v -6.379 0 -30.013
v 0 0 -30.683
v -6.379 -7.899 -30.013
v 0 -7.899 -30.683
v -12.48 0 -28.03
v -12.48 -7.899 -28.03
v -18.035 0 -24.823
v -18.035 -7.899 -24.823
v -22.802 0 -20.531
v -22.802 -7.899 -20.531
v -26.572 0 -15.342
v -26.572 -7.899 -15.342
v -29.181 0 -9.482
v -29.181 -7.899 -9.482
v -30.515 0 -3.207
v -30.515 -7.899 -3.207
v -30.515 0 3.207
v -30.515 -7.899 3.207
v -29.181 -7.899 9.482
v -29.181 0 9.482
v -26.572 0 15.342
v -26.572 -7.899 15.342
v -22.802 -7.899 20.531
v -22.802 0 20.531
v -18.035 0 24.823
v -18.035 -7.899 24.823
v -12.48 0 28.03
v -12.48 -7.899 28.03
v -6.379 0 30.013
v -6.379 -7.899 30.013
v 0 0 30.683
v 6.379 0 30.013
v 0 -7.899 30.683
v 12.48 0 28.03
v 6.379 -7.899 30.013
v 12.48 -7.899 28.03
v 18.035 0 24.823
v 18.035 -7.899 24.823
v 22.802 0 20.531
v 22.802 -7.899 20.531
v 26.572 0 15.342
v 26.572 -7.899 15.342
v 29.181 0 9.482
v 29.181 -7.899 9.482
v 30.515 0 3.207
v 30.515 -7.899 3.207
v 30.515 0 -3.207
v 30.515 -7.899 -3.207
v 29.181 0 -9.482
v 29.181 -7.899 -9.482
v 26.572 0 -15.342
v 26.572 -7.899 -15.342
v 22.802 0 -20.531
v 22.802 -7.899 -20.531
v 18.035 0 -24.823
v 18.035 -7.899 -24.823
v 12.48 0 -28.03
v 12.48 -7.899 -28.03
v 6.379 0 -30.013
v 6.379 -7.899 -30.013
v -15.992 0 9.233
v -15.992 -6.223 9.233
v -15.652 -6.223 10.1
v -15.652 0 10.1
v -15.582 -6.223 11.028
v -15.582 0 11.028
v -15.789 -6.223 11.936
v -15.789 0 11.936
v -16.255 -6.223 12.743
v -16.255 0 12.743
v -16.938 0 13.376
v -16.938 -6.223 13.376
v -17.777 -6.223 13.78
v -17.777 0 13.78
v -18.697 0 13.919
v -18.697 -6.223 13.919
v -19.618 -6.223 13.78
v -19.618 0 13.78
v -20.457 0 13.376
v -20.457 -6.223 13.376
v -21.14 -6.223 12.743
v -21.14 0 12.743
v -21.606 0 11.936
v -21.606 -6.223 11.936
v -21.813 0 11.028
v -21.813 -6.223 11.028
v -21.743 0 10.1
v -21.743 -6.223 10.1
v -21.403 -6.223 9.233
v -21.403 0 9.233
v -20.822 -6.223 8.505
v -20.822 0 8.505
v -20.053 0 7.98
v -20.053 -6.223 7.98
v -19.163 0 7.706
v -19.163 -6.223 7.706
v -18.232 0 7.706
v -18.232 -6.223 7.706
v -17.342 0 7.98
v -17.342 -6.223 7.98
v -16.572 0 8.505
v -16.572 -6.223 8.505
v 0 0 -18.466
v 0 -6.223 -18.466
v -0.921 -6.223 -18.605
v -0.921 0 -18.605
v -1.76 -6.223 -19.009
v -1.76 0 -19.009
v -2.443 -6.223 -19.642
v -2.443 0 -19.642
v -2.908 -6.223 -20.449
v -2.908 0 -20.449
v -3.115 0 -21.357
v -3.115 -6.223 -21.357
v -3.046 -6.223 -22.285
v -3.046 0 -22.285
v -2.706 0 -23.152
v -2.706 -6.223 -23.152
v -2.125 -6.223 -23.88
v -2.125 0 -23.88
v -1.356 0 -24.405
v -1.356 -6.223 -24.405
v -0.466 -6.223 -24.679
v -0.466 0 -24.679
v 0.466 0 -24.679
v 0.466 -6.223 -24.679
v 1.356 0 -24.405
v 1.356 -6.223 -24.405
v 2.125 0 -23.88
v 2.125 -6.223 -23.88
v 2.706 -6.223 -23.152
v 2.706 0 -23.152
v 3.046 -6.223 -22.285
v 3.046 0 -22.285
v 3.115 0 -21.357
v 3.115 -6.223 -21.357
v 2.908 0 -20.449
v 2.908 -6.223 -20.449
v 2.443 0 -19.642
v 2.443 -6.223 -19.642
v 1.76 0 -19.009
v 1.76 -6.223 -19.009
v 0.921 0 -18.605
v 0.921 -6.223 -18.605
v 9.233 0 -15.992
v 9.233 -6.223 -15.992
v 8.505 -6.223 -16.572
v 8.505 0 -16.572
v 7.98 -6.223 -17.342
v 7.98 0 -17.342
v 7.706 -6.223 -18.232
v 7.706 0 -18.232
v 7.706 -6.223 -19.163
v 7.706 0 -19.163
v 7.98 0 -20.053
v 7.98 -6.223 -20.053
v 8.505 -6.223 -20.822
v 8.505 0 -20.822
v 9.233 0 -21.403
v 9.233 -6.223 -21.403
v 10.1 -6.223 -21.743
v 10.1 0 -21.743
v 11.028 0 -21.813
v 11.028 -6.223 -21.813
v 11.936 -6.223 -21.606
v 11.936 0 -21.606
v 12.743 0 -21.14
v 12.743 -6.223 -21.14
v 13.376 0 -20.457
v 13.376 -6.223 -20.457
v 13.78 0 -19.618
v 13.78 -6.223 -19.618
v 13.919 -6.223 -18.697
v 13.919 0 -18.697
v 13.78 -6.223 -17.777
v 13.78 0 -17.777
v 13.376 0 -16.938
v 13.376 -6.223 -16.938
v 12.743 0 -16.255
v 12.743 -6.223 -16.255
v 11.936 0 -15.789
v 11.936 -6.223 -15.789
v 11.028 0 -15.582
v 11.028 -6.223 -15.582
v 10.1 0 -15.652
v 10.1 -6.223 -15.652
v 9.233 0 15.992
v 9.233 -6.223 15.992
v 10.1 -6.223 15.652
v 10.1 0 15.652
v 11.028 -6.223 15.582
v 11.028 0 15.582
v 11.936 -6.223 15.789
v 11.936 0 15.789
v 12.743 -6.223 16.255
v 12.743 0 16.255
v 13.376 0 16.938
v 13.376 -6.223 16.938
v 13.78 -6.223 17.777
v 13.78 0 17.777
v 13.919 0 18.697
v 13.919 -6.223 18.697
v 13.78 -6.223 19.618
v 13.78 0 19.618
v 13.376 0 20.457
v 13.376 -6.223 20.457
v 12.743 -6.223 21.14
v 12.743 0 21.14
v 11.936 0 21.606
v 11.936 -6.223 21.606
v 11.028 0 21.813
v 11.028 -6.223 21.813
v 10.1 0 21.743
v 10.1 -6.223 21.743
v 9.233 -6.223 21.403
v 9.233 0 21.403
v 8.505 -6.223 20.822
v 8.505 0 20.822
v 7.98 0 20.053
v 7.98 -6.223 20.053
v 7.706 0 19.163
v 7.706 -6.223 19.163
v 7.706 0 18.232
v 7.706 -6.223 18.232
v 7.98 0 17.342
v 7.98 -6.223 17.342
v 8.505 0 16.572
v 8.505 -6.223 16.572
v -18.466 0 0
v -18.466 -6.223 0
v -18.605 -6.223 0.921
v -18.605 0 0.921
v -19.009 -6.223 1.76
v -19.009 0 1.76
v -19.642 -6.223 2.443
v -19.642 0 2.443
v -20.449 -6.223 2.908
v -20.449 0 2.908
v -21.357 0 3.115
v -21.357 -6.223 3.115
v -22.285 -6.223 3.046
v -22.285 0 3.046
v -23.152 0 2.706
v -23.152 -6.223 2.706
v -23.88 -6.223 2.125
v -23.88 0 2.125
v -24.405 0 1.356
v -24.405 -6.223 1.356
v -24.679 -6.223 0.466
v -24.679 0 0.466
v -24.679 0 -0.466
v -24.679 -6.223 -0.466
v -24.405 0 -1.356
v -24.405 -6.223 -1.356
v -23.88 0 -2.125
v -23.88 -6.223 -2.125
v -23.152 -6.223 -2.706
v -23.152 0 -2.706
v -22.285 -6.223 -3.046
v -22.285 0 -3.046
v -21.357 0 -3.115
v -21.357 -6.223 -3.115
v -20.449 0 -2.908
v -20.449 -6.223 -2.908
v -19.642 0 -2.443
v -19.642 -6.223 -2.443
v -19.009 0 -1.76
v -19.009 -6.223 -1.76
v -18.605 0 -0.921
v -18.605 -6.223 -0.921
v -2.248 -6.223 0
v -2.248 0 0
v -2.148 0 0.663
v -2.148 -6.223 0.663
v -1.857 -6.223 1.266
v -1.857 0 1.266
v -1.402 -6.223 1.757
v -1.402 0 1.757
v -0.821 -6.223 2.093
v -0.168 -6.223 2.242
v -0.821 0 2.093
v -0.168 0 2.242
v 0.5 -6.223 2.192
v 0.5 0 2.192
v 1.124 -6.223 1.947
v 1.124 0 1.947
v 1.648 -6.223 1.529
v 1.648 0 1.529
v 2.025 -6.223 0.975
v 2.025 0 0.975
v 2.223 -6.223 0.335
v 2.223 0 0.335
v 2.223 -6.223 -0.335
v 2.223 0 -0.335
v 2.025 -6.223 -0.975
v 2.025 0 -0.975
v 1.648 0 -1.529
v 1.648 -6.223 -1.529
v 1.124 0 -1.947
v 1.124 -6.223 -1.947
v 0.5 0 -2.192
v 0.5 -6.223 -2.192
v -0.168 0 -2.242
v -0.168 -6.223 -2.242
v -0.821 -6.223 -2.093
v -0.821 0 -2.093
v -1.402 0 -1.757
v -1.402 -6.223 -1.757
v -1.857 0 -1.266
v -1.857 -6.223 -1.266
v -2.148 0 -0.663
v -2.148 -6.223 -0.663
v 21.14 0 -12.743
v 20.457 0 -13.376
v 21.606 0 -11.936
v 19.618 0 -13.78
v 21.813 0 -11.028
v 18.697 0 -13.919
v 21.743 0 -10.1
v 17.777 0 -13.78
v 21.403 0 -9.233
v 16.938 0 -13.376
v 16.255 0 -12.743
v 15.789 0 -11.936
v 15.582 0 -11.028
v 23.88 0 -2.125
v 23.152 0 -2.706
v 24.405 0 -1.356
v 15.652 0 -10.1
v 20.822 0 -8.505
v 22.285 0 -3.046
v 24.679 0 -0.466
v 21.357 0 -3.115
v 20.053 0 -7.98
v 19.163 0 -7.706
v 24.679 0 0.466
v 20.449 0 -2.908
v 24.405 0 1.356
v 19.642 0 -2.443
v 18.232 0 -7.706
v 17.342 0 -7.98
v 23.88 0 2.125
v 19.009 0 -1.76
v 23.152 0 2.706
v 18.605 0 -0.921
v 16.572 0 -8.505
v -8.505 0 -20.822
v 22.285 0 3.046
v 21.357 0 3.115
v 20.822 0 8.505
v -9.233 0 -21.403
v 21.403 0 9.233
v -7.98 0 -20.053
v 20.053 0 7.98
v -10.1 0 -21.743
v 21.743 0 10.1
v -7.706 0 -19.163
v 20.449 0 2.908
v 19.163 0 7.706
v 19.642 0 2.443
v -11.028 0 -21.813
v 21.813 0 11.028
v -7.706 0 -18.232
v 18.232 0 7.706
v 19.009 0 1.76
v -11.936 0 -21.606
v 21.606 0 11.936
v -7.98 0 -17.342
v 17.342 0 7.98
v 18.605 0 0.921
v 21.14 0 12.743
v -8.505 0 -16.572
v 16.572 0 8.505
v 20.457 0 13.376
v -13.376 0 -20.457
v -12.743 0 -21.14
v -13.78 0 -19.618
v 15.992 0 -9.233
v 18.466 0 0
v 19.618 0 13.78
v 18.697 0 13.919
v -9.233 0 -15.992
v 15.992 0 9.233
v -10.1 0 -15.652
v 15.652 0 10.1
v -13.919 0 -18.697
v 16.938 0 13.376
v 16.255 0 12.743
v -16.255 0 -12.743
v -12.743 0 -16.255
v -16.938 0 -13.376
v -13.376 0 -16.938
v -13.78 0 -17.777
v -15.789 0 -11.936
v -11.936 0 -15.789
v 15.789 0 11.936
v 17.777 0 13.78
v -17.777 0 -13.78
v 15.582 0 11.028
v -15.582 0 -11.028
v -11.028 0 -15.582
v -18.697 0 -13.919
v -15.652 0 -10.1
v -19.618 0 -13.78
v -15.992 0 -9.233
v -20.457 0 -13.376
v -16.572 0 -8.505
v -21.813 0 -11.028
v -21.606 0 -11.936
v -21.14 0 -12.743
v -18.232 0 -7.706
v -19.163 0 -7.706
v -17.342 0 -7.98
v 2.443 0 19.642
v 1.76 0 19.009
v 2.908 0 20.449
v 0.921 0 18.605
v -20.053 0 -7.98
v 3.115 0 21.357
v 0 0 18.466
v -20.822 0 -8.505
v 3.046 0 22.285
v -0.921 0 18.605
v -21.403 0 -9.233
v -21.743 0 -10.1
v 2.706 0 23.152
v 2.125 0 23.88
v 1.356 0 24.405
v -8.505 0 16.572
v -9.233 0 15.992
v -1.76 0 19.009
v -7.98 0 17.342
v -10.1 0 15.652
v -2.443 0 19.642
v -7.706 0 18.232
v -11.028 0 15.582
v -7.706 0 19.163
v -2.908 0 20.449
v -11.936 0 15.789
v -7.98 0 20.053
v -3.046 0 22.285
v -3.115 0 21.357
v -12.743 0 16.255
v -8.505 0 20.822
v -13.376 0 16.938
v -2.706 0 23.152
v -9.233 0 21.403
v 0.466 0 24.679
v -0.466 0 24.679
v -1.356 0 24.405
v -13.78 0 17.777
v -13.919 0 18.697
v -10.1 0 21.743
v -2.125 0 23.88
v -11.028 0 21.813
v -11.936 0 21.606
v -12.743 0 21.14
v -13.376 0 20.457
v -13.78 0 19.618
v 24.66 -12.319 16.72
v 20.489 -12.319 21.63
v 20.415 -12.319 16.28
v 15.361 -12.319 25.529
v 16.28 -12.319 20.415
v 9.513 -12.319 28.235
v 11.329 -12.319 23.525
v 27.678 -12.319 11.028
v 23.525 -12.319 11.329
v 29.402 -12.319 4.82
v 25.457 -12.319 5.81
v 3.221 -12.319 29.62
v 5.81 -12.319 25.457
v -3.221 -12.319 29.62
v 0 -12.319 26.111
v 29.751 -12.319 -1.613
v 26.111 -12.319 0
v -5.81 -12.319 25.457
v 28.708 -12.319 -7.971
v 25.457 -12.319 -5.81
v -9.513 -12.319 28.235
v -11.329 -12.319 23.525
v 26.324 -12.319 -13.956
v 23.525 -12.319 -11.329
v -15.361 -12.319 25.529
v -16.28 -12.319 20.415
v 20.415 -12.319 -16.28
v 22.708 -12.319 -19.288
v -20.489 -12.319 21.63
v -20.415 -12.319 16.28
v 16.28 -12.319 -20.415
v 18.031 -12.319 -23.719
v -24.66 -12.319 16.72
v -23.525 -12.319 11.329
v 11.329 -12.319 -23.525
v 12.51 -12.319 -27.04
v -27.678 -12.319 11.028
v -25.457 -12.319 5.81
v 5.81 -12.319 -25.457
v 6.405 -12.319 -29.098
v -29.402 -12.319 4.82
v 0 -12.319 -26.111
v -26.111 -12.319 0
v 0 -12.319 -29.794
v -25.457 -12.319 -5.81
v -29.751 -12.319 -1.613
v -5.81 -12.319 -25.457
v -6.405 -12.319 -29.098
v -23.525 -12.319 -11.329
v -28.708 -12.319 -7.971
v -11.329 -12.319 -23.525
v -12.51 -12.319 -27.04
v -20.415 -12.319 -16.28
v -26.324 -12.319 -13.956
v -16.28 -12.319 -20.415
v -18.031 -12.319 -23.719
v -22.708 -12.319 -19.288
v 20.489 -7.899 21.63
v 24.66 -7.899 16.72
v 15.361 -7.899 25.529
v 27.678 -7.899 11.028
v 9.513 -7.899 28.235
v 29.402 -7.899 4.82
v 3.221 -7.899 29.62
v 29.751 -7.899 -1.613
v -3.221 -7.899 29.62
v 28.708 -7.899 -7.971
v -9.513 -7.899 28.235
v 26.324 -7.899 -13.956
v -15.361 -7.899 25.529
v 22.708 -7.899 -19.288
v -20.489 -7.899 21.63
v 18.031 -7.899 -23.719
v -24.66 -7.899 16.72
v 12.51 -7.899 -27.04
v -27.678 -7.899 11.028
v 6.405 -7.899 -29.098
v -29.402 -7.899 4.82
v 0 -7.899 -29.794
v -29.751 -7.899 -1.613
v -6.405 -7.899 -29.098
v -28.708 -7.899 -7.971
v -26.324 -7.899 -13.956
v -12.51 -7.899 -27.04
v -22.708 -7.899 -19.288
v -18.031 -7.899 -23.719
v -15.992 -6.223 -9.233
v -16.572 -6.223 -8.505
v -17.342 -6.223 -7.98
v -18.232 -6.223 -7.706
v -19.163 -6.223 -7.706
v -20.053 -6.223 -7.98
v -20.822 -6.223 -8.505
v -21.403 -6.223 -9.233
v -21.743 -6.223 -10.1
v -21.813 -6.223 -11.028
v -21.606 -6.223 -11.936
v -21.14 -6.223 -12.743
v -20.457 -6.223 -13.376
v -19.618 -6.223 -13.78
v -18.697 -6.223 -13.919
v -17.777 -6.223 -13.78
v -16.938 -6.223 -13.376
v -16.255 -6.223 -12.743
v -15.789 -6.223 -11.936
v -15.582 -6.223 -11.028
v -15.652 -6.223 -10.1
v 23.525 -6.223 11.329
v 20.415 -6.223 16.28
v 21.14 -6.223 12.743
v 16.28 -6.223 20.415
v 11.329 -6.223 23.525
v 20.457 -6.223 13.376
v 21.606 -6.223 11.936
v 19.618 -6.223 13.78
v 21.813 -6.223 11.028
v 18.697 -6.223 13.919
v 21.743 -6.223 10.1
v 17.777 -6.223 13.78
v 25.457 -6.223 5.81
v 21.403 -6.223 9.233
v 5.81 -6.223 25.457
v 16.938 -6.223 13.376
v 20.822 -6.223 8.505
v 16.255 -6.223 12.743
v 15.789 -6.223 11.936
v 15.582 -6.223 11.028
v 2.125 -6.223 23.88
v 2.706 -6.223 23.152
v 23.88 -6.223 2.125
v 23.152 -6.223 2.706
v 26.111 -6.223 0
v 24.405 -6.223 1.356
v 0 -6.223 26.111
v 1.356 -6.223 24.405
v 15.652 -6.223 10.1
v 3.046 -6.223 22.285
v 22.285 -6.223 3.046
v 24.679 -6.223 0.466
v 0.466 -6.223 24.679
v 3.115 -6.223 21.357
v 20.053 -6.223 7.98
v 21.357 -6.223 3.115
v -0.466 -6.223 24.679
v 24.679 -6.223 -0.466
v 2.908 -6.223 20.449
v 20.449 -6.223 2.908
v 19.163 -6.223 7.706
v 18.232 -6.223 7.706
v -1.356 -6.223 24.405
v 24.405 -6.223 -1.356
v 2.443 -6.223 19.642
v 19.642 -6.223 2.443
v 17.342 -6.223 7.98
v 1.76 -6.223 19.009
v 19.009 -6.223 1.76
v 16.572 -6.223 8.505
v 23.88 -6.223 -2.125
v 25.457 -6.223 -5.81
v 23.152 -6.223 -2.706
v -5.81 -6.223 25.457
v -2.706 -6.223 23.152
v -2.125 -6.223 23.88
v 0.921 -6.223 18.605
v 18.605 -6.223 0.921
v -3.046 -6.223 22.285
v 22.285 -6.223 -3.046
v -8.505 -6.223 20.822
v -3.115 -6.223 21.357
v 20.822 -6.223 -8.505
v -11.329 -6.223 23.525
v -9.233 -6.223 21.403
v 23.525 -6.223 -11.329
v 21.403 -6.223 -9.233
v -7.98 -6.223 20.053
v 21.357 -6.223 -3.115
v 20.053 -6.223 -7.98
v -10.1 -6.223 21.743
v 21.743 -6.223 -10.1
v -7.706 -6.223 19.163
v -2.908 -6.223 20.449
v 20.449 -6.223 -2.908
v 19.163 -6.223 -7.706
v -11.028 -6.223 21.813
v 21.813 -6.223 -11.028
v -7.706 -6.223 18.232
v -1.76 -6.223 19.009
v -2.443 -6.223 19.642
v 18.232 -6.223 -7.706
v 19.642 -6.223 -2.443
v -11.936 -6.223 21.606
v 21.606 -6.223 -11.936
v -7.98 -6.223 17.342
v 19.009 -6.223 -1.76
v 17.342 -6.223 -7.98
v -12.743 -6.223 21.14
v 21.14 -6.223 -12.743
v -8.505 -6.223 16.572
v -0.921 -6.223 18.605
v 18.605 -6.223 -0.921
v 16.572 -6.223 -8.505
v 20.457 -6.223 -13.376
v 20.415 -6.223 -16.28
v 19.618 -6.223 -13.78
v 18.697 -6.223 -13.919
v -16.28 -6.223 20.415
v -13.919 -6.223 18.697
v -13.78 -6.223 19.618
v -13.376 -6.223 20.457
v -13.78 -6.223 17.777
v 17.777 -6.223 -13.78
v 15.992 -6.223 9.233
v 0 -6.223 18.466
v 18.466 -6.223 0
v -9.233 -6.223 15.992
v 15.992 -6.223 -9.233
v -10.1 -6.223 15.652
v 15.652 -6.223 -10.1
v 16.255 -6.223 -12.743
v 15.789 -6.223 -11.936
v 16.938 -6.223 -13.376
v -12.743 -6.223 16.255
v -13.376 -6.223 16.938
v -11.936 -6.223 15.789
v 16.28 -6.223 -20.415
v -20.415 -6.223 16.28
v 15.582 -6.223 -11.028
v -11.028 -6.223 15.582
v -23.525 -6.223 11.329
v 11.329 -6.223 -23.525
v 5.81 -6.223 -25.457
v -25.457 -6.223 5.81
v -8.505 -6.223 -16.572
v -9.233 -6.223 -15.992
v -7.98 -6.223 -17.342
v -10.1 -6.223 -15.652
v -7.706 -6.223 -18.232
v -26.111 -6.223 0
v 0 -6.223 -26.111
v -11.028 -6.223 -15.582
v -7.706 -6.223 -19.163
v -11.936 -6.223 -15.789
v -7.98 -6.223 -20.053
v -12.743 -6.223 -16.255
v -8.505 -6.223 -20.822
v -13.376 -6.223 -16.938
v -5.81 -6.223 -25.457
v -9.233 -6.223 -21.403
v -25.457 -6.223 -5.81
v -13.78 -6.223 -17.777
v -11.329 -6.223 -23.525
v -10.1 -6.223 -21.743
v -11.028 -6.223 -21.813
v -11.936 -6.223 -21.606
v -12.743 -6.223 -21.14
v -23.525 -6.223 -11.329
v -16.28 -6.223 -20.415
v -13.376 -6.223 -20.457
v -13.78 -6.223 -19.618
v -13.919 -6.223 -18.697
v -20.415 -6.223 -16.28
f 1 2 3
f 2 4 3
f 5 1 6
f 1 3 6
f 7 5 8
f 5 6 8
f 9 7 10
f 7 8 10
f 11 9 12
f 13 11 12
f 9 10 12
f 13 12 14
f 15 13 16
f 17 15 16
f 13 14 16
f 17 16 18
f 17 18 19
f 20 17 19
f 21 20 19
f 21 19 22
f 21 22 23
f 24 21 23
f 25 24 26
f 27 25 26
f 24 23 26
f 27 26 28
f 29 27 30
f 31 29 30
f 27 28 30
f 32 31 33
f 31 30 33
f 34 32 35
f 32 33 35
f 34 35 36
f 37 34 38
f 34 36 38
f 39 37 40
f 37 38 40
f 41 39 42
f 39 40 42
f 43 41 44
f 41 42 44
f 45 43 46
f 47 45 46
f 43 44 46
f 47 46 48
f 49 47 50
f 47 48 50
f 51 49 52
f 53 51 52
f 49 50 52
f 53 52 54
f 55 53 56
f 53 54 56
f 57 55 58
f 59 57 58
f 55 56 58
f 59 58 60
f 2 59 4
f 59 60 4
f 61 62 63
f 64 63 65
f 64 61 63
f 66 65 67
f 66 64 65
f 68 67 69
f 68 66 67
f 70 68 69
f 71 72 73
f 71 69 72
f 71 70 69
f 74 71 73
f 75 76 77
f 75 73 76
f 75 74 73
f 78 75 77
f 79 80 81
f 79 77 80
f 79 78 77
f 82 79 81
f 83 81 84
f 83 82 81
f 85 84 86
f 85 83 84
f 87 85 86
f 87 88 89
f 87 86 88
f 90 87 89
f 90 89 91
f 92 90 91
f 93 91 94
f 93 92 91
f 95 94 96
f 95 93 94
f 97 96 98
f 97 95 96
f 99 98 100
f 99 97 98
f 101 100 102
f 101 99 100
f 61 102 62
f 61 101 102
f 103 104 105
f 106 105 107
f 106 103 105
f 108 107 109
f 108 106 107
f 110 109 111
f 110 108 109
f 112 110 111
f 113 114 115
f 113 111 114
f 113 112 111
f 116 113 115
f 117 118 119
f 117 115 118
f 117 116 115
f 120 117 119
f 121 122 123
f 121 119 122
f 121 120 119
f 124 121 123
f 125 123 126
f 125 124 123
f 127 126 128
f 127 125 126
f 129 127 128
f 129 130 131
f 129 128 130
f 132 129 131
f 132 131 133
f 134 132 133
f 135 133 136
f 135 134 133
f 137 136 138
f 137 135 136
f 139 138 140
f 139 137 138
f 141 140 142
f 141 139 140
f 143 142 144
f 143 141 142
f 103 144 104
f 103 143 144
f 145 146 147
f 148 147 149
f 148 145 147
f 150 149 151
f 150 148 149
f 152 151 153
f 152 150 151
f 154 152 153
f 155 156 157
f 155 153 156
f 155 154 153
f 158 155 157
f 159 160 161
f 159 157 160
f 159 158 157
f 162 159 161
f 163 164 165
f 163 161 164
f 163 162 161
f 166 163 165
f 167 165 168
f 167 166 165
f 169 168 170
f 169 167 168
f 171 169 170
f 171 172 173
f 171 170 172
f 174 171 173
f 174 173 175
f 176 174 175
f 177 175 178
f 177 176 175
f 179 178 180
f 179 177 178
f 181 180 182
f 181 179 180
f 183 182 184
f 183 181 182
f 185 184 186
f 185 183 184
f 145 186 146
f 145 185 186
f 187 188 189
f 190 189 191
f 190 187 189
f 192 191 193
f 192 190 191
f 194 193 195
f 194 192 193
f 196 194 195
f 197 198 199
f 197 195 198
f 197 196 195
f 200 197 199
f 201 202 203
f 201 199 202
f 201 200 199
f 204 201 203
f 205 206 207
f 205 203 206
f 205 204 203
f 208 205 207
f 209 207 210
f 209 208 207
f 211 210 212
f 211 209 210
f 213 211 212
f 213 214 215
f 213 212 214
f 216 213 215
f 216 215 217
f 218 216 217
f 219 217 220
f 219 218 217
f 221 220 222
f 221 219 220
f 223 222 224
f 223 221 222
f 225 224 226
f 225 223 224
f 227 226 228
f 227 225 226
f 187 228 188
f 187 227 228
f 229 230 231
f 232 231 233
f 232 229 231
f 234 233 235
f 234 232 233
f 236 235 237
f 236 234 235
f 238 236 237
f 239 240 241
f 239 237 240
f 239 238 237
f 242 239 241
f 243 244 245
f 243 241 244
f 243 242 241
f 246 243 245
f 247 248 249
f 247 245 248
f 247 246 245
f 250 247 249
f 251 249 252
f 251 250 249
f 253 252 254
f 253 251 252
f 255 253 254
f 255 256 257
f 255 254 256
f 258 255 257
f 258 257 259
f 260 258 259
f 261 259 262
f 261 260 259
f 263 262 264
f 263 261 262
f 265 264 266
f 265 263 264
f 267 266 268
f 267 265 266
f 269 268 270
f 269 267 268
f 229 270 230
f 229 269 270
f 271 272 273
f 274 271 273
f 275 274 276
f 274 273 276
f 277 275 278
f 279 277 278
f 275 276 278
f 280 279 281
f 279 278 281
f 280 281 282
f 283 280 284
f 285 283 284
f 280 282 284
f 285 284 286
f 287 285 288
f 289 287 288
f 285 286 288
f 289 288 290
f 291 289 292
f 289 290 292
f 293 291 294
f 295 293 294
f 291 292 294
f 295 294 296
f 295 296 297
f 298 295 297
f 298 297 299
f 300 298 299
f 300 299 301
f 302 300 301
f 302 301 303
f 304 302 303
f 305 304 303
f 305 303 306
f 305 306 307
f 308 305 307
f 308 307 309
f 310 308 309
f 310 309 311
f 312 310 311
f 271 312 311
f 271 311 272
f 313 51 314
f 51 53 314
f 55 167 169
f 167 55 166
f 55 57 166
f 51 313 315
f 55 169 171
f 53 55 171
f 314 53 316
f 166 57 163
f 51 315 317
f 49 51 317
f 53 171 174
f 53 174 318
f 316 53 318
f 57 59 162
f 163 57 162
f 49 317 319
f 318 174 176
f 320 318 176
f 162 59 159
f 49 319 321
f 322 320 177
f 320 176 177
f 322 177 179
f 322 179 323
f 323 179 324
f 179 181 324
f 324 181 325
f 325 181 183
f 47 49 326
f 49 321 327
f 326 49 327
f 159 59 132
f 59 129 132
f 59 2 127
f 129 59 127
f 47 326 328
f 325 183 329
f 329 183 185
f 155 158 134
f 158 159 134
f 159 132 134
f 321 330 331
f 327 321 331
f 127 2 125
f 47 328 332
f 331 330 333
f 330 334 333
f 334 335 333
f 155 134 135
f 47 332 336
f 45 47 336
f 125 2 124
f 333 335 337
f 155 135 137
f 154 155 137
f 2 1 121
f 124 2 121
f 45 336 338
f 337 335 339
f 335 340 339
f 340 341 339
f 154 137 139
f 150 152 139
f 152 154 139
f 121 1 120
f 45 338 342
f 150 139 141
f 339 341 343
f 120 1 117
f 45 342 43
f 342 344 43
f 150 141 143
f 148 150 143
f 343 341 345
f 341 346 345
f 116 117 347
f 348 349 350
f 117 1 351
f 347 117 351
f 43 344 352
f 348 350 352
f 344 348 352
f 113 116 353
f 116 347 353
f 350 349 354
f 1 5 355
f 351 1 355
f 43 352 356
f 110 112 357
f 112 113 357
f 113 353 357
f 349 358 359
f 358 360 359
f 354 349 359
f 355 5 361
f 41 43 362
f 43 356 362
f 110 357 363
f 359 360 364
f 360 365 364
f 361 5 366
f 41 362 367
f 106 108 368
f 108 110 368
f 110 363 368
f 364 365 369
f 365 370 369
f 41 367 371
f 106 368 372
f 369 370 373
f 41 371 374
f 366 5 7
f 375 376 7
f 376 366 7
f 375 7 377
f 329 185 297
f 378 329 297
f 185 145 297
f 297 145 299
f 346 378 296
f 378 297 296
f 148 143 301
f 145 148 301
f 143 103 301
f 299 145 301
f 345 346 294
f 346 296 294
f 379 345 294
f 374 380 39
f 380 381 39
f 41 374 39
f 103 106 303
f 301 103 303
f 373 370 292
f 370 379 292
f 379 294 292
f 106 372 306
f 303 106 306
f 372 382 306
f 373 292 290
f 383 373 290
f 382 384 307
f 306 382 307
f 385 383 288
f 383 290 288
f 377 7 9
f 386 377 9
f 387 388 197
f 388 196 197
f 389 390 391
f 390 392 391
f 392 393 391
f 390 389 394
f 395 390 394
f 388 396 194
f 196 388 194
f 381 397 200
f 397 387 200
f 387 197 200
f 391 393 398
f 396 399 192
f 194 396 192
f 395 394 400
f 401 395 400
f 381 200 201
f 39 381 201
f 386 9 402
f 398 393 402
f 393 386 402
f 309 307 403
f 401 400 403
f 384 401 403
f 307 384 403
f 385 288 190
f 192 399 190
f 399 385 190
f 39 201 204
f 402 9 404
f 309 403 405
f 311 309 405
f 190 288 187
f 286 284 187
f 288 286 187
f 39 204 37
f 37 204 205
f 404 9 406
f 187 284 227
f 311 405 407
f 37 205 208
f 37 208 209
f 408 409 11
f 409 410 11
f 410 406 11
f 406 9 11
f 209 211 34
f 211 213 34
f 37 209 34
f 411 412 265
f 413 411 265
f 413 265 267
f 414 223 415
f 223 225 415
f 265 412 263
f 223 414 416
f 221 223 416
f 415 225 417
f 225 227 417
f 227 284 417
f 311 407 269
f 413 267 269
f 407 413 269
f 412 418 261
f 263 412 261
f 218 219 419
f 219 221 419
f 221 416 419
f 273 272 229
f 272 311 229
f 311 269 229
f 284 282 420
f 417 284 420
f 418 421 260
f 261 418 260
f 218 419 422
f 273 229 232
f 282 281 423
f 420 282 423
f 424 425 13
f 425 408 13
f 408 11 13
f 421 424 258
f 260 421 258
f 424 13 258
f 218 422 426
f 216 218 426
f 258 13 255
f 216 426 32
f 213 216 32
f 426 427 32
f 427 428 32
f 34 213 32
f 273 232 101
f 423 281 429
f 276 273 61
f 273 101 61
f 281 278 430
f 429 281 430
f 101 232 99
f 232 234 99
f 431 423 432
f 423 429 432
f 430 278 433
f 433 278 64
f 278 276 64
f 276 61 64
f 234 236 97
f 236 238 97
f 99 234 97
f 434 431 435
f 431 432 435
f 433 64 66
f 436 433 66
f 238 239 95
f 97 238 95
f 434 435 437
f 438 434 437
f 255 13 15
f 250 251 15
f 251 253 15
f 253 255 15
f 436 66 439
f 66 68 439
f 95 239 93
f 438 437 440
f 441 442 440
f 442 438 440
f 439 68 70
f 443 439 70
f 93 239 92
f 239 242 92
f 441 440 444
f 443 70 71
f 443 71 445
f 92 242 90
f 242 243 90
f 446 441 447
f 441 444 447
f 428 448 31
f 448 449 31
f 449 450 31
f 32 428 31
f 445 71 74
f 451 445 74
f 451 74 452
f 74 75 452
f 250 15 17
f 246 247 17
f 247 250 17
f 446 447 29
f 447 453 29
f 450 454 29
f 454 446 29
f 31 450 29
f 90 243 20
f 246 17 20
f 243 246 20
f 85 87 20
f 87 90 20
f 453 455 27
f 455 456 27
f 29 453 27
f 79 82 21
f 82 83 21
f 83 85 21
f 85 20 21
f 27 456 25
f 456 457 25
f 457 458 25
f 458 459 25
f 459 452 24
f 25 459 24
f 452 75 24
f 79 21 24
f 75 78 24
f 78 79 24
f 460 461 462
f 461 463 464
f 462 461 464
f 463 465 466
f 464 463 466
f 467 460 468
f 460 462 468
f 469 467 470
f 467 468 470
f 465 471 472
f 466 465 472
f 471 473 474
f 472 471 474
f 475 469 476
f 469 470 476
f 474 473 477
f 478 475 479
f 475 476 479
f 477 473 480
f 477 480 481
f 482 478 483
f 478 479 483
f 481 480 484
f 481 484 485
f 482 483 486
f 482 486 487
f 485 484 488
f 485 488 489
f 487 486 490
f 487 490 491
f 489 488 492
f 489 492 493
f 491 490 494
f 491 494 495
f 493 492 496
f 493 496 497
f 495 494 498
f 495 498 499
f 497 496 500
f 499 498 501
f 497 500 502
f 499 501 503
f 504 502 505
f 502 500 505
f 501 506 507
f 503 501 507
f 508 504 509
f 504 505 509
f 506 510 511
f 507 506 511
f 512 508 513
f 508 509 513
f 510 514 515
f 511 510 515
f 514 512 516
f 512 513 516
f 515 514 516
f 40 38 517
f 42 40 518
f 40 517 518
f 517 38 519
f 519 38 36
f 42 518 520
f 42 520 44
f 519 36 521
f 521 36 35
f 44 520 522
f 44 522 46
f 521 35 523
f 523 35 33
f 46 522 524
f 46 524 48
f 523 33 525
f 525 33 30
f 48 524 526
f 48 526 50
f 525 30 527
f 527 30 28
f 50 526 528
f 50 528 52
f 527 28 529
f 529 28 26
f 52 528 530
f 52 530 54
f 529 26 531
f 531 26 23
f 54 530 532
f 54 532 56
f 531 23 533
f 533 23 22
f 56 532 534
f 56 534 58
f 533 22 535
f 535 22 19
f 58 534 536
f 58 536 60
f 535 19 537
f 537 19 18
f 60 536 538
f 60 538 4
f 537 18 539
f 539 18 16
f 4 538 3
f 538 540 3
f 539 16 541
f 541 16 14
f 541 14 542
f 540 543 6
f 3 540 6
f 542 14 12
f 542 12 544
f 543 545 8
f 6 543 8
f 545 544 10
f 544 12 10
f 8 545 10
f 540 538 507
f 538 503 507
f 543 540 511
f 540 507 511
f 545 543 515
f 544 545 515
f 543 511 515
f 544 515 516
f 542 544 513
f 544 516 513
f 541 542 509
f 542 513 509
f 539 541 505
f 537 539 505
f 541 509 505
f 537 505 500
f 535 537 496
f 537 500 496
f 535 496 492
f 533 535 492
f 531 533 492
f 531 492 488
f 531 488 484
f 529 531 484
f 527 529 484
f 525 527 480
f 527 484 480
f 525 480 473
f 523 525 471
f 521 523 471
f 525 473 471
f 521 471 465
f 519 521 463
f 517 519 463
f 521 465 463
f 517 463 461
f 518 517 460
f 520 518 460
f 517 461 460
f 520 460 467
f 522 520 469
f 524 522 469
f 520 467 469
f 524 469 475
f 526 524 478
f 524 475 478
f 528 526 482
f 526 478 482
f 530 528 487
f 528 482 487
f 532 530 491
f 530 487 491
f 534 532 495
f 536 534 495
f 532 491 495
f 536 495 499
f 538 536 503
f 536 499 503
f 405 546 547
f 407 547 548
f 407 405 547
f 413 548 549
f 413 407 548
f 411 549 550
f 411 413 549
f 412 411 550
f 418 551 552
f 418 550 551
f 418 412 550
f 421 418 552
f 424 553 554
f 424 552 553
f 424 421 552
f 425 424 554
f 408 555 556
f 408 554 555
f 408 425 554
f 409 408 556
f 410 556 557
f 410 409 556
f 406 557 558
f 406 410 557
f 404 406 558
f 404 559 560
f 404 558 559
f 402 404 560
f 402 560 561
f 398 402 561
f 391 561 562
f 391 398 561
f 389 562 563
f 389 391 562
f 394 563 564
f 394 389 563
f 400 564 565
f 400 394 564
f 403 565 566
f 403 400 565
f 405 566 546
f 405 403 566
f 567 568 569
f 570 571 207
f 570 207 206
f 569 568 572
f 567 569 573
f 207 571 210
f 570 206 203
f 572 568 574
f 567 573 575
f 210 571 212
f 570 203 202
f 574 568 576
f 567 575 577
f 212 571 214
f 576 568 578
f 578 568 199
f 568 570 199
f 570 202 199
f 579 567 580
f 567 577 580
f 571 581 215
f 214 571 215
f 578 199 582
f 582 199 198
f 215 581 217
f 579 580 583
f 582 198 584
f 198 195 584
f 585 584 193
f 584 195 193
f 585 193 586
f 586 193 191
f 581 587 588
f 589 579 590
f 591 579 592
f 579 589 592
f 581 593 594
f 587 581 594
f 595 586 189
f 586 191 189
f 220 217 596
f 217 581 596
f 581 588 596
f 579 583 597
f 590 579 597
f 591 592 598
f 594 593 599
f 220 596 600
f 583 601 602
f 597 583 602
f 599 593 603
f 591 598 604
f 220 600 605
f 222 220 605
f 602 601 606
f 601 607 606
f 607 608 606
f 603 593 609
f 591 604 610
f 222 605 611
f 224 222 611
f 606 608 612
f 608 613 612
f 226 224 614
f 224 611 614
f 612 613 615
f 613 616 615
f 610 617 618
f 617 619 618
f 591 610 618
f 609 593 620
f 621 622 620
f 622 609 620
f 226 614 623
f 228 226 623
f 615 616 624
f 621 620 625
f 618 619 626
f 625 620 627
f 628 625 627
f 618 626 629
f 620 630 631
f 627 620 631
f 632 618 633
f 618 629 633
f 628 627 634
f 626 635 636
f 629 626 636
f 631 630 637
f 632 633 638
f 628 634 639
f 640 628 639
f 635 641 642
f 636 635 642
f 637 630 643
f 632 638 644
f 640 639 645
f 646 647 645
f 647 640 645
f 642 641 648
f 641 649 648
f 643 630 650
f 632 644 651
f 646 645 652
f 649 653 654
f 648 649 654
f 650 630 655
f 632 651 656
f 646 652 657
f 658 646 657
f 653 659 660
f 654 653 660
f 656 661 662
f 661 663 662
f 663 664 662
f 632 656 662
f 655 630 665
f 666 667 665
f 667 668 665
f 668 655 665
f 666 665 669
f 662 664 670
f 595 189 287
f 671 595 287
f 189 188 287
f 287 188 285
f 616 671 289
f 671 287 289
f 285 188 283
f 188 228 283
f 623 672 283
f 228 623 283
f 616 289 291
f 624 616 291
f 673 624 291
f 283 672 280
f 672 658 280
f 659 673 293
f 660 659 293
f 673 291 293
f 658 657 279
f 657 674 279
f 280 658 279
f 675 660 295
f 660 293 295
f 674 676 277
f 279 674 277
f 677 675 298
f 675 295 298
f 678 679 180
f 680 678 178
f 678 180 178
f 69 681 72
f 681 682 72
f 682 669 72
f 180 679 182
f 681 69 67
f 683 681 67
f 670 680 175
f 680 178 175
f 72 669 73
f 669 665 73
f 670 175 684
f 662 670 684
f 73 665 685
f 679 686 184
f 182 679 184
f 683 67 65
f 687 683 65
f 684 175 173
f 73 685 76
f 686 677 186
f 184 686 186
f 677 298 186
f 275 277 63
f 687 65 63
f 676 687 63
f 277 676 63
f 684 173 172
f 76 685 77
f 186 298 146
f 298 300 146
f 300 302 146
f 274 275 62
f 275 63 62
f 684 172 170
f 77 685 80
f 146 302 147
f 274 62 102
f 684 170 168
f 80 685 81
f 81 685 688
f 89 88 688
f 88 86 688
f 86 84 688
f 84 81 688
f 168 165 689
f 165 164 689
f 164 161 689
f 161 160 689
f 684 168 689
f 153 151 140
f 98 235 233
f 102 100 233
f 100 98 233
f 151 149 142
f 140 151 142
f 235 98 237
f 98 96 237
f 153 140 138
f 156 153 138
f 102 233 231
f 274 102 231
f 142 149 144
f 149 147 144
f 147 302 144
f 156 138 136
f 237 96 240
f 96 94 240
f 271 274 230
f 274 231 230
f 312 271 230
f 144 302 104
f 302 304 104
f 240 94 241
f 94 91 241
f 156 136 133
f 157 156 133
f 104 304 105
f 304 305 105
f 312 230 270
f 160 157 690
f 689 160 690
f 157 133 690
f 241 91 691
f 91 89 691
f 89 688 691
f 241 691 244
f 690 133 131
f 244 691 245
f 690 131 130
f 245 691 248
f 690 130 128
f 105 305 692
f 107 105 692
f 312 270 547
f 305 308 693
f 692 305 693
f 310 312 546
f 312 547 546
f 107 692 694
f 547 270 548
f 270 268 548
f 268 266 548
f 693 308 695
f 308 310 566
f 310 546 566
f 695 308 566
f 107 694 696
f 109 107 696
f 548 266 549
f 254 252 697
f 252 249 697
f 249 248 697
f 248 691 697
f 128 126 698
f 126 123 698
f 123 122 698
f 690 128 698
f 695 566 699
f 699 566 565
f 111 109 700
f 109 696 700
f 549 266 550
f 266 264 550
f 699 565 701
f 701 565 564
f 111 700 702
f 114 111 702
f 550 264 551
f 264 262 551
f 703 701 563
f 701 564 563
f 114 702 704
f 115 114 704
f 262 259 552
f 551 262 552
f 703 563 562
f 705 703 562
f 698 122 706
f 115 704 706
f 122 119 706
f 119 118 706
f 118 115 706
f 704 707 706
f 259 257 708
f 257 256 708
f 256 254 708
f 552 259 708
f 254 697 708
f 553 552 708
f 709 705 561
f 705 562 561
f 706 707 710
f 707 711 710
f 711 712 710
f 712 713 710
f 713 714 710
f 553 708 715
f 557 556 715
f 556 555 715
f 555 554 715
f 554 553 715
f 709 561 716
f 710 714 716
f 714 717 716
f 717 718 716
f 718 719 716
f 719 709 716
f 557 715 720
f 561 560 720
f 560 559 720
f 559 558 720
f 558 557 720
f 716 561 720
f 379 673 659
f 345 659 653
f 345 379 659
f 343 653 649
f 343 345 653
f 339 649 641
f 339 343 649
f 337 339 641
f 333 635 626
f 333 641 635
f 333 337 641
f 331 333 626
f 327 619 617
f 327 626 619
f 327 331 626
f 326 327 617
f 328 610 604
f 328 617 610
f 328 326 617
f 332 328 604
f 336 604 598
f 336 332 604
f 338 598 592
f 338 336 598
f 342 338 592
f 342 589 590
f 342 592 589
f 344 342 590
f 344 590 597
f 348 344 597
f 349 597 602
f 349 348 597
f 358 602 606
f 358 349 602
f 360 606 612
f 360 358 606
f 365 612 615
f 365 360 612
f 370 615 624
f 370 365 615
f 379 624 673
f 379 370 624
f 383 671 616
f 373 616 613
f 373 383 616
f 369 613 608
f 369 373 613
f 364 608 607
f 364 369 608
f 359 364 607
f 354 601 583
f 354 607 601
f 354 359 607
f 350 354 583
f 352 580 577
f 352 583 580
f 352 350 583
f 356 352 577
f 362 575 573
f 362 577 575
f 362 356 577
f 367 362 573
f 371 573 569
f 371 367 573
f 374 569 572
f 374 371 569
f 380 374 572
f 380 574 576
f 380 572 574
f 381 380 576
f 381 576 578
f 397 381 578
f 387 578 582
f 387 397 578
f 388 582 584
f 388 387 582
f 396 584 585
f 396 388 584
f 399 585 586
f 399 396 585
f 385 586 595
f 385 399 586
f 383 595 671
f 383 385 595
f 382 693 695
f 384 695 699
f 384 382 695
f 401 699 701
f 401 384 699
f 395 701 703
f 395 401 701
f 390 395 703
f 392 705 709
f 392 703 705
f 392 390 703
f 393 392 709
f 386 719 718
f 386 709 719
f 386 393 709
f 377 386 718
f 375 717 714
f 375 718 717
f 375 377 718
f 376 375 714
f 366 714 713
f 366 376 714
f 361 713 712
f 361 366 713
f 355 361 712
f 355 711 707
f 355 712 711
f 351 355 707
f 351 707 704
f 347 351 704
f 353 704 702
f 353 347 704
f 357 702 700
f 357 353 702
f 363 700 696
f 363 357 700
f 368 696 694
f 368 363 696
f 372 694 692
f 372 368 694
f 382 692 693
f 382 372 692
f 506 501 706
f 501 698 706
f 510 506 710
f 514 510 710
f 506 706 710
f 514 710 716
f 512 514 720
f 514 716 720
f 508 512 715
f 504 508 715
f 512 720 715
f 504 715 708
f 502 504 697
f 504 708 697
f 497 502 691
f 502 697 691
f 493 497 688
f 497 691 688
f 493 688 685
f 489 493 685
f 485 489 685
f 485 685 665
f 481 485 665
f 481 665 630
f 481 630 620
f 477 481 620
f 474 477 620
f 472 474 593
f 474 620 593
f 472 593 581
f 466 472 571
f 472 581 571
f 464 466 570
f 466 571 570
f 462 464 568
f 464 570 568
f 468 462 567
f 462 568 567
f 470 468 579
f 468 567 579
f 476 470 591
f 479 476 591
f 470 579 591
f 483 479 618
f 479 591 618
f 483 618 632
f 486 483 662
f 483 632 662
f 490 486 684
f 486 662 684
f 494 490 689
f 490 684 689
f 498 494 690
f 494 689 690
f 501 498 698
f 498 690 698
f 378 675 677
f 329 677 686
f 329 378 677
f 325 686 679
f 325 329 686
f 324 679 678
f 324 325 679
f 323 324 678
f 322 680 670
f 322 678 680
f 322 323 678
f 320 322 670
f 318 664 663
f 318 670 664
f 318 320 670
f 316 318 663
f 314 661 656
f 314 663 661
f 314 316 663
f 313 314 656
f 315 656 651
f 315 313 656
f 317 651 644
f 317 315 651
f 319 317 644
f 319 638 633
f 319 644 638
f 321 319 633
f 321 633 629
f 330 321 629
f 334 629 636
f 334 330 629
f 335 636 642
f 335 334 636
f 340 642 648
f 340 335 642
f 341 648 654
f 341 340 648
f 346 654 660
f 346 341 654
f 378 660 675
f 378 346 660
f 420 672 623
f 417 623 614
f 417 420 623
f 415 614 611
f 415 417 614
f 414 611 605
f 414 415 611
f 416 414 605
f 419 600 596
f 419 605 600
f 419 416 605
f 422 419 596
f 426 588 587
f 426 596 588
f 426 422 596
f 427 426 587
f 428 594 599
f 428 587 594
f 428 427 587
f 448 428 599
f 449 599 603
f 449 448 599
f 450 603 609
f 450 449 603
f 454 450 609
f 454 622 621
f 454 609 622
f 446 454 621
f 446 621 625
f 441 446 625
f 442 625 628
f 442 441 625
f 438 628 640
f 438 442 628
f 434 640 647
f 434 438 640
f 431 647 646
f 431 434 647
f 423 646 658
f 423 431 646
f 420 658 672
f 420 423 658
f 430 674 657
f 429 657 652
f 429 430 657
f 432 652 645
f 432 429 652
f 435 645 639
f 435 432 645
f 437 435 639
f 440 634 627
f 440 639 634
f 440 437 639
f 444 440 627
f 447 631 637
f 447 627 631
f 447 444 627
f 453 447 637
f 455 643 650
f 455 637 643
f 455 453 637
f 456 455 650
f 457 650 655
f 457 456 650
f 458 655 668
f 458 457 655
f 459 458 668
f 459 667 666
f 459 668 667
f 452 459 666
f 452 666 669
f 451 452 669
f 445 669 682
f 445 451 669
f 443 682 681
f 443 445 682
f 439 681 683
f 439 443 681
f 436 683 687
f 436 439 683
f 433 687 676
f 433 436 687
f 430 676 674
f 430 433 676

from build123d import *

# Parameters (mm, degrees)
CIRPATTERN1_COUNT         = 12
F_8_CLEARANCE_HOLE1_D     = 4.4958
F_8_CLEARANCE_HOLE1_DEPTH = 9.652
F_8_CLEARANCE_HOLE1_TIP   = 1.350674586


with BuildPart() as part:
    # Sketch1 → Revolve1 (revolve)
    with BuildSketch(Plane.XY, mode=Mode.PRIVATE) as revolve1_sk:
        Polygon((0, 0), (-30.6832, 0), (-30.6832, -7.8994), (-29.7942, -7.8994), (-29.7942, -12.319), (-26.1112, -12.319), (-26.1112, -6.223), (0, -6.223), align=None)
    revolve(revolve1_sk.sketch.rotate(Axis((0, -6.223, 0), (0, 1, 0)), 270), axis=Axis((0, -6.223, 0), (0, 1, 0)))

    # Sketch3 → D (0.246) Diameter Hole1 (revolve, cut)
    with BuildSketch(Plane(origin=(0, 0, -21.59), x_dir=(0, 0, 1), z_dir=(1, 0, 0))):
        Polygon((0, 0), (0, 14.577208746), (3.1242, 12.7), (3.1242, 0), align=None)
    d_0_246_diameter_hole1 = revolve(axis=Axis((0, 6.35, -21.59), (0, -1, 0)), mode=Mode.SUBTRACT)

    # CirPattern1: D (0.246) Diameter Hole1 ×12 about axis
    cirpattern1_axis = Axis((0, 0, 0), (0, 1, 0))
    for i in range(1, CIRPATTERN1_COUNT):
        add(d_0_246_diameter_hole1.rotate(cirpattern1_axis, i * 360 / CIRPATTERN1_COUNT), mode=Mode.SUBTRACT)

    # #8 Clearance Hole1
    with Locations(Plane.XZ.offset(6.223)):
        with Locations((0, 0)):
            Hole(F_8_CLEARANCE_HOLE1_D / 2, depth=F_8_CLEARANCE_HOLE1_DEPTH)
            with Locations((0, 0, -(F_8_CLEARANCE_HOLE1_DEPTH + F_8_CLEARANCE_HOLE1_TIP / 2))):  # 118° drill point
                Cone(0, F_8_CLEARANCE_HOLE1_D / 2, F_8_CLEARANCE_HOLE1_TIP, mode=Mode.SUBTRACT)


solid = part.part
